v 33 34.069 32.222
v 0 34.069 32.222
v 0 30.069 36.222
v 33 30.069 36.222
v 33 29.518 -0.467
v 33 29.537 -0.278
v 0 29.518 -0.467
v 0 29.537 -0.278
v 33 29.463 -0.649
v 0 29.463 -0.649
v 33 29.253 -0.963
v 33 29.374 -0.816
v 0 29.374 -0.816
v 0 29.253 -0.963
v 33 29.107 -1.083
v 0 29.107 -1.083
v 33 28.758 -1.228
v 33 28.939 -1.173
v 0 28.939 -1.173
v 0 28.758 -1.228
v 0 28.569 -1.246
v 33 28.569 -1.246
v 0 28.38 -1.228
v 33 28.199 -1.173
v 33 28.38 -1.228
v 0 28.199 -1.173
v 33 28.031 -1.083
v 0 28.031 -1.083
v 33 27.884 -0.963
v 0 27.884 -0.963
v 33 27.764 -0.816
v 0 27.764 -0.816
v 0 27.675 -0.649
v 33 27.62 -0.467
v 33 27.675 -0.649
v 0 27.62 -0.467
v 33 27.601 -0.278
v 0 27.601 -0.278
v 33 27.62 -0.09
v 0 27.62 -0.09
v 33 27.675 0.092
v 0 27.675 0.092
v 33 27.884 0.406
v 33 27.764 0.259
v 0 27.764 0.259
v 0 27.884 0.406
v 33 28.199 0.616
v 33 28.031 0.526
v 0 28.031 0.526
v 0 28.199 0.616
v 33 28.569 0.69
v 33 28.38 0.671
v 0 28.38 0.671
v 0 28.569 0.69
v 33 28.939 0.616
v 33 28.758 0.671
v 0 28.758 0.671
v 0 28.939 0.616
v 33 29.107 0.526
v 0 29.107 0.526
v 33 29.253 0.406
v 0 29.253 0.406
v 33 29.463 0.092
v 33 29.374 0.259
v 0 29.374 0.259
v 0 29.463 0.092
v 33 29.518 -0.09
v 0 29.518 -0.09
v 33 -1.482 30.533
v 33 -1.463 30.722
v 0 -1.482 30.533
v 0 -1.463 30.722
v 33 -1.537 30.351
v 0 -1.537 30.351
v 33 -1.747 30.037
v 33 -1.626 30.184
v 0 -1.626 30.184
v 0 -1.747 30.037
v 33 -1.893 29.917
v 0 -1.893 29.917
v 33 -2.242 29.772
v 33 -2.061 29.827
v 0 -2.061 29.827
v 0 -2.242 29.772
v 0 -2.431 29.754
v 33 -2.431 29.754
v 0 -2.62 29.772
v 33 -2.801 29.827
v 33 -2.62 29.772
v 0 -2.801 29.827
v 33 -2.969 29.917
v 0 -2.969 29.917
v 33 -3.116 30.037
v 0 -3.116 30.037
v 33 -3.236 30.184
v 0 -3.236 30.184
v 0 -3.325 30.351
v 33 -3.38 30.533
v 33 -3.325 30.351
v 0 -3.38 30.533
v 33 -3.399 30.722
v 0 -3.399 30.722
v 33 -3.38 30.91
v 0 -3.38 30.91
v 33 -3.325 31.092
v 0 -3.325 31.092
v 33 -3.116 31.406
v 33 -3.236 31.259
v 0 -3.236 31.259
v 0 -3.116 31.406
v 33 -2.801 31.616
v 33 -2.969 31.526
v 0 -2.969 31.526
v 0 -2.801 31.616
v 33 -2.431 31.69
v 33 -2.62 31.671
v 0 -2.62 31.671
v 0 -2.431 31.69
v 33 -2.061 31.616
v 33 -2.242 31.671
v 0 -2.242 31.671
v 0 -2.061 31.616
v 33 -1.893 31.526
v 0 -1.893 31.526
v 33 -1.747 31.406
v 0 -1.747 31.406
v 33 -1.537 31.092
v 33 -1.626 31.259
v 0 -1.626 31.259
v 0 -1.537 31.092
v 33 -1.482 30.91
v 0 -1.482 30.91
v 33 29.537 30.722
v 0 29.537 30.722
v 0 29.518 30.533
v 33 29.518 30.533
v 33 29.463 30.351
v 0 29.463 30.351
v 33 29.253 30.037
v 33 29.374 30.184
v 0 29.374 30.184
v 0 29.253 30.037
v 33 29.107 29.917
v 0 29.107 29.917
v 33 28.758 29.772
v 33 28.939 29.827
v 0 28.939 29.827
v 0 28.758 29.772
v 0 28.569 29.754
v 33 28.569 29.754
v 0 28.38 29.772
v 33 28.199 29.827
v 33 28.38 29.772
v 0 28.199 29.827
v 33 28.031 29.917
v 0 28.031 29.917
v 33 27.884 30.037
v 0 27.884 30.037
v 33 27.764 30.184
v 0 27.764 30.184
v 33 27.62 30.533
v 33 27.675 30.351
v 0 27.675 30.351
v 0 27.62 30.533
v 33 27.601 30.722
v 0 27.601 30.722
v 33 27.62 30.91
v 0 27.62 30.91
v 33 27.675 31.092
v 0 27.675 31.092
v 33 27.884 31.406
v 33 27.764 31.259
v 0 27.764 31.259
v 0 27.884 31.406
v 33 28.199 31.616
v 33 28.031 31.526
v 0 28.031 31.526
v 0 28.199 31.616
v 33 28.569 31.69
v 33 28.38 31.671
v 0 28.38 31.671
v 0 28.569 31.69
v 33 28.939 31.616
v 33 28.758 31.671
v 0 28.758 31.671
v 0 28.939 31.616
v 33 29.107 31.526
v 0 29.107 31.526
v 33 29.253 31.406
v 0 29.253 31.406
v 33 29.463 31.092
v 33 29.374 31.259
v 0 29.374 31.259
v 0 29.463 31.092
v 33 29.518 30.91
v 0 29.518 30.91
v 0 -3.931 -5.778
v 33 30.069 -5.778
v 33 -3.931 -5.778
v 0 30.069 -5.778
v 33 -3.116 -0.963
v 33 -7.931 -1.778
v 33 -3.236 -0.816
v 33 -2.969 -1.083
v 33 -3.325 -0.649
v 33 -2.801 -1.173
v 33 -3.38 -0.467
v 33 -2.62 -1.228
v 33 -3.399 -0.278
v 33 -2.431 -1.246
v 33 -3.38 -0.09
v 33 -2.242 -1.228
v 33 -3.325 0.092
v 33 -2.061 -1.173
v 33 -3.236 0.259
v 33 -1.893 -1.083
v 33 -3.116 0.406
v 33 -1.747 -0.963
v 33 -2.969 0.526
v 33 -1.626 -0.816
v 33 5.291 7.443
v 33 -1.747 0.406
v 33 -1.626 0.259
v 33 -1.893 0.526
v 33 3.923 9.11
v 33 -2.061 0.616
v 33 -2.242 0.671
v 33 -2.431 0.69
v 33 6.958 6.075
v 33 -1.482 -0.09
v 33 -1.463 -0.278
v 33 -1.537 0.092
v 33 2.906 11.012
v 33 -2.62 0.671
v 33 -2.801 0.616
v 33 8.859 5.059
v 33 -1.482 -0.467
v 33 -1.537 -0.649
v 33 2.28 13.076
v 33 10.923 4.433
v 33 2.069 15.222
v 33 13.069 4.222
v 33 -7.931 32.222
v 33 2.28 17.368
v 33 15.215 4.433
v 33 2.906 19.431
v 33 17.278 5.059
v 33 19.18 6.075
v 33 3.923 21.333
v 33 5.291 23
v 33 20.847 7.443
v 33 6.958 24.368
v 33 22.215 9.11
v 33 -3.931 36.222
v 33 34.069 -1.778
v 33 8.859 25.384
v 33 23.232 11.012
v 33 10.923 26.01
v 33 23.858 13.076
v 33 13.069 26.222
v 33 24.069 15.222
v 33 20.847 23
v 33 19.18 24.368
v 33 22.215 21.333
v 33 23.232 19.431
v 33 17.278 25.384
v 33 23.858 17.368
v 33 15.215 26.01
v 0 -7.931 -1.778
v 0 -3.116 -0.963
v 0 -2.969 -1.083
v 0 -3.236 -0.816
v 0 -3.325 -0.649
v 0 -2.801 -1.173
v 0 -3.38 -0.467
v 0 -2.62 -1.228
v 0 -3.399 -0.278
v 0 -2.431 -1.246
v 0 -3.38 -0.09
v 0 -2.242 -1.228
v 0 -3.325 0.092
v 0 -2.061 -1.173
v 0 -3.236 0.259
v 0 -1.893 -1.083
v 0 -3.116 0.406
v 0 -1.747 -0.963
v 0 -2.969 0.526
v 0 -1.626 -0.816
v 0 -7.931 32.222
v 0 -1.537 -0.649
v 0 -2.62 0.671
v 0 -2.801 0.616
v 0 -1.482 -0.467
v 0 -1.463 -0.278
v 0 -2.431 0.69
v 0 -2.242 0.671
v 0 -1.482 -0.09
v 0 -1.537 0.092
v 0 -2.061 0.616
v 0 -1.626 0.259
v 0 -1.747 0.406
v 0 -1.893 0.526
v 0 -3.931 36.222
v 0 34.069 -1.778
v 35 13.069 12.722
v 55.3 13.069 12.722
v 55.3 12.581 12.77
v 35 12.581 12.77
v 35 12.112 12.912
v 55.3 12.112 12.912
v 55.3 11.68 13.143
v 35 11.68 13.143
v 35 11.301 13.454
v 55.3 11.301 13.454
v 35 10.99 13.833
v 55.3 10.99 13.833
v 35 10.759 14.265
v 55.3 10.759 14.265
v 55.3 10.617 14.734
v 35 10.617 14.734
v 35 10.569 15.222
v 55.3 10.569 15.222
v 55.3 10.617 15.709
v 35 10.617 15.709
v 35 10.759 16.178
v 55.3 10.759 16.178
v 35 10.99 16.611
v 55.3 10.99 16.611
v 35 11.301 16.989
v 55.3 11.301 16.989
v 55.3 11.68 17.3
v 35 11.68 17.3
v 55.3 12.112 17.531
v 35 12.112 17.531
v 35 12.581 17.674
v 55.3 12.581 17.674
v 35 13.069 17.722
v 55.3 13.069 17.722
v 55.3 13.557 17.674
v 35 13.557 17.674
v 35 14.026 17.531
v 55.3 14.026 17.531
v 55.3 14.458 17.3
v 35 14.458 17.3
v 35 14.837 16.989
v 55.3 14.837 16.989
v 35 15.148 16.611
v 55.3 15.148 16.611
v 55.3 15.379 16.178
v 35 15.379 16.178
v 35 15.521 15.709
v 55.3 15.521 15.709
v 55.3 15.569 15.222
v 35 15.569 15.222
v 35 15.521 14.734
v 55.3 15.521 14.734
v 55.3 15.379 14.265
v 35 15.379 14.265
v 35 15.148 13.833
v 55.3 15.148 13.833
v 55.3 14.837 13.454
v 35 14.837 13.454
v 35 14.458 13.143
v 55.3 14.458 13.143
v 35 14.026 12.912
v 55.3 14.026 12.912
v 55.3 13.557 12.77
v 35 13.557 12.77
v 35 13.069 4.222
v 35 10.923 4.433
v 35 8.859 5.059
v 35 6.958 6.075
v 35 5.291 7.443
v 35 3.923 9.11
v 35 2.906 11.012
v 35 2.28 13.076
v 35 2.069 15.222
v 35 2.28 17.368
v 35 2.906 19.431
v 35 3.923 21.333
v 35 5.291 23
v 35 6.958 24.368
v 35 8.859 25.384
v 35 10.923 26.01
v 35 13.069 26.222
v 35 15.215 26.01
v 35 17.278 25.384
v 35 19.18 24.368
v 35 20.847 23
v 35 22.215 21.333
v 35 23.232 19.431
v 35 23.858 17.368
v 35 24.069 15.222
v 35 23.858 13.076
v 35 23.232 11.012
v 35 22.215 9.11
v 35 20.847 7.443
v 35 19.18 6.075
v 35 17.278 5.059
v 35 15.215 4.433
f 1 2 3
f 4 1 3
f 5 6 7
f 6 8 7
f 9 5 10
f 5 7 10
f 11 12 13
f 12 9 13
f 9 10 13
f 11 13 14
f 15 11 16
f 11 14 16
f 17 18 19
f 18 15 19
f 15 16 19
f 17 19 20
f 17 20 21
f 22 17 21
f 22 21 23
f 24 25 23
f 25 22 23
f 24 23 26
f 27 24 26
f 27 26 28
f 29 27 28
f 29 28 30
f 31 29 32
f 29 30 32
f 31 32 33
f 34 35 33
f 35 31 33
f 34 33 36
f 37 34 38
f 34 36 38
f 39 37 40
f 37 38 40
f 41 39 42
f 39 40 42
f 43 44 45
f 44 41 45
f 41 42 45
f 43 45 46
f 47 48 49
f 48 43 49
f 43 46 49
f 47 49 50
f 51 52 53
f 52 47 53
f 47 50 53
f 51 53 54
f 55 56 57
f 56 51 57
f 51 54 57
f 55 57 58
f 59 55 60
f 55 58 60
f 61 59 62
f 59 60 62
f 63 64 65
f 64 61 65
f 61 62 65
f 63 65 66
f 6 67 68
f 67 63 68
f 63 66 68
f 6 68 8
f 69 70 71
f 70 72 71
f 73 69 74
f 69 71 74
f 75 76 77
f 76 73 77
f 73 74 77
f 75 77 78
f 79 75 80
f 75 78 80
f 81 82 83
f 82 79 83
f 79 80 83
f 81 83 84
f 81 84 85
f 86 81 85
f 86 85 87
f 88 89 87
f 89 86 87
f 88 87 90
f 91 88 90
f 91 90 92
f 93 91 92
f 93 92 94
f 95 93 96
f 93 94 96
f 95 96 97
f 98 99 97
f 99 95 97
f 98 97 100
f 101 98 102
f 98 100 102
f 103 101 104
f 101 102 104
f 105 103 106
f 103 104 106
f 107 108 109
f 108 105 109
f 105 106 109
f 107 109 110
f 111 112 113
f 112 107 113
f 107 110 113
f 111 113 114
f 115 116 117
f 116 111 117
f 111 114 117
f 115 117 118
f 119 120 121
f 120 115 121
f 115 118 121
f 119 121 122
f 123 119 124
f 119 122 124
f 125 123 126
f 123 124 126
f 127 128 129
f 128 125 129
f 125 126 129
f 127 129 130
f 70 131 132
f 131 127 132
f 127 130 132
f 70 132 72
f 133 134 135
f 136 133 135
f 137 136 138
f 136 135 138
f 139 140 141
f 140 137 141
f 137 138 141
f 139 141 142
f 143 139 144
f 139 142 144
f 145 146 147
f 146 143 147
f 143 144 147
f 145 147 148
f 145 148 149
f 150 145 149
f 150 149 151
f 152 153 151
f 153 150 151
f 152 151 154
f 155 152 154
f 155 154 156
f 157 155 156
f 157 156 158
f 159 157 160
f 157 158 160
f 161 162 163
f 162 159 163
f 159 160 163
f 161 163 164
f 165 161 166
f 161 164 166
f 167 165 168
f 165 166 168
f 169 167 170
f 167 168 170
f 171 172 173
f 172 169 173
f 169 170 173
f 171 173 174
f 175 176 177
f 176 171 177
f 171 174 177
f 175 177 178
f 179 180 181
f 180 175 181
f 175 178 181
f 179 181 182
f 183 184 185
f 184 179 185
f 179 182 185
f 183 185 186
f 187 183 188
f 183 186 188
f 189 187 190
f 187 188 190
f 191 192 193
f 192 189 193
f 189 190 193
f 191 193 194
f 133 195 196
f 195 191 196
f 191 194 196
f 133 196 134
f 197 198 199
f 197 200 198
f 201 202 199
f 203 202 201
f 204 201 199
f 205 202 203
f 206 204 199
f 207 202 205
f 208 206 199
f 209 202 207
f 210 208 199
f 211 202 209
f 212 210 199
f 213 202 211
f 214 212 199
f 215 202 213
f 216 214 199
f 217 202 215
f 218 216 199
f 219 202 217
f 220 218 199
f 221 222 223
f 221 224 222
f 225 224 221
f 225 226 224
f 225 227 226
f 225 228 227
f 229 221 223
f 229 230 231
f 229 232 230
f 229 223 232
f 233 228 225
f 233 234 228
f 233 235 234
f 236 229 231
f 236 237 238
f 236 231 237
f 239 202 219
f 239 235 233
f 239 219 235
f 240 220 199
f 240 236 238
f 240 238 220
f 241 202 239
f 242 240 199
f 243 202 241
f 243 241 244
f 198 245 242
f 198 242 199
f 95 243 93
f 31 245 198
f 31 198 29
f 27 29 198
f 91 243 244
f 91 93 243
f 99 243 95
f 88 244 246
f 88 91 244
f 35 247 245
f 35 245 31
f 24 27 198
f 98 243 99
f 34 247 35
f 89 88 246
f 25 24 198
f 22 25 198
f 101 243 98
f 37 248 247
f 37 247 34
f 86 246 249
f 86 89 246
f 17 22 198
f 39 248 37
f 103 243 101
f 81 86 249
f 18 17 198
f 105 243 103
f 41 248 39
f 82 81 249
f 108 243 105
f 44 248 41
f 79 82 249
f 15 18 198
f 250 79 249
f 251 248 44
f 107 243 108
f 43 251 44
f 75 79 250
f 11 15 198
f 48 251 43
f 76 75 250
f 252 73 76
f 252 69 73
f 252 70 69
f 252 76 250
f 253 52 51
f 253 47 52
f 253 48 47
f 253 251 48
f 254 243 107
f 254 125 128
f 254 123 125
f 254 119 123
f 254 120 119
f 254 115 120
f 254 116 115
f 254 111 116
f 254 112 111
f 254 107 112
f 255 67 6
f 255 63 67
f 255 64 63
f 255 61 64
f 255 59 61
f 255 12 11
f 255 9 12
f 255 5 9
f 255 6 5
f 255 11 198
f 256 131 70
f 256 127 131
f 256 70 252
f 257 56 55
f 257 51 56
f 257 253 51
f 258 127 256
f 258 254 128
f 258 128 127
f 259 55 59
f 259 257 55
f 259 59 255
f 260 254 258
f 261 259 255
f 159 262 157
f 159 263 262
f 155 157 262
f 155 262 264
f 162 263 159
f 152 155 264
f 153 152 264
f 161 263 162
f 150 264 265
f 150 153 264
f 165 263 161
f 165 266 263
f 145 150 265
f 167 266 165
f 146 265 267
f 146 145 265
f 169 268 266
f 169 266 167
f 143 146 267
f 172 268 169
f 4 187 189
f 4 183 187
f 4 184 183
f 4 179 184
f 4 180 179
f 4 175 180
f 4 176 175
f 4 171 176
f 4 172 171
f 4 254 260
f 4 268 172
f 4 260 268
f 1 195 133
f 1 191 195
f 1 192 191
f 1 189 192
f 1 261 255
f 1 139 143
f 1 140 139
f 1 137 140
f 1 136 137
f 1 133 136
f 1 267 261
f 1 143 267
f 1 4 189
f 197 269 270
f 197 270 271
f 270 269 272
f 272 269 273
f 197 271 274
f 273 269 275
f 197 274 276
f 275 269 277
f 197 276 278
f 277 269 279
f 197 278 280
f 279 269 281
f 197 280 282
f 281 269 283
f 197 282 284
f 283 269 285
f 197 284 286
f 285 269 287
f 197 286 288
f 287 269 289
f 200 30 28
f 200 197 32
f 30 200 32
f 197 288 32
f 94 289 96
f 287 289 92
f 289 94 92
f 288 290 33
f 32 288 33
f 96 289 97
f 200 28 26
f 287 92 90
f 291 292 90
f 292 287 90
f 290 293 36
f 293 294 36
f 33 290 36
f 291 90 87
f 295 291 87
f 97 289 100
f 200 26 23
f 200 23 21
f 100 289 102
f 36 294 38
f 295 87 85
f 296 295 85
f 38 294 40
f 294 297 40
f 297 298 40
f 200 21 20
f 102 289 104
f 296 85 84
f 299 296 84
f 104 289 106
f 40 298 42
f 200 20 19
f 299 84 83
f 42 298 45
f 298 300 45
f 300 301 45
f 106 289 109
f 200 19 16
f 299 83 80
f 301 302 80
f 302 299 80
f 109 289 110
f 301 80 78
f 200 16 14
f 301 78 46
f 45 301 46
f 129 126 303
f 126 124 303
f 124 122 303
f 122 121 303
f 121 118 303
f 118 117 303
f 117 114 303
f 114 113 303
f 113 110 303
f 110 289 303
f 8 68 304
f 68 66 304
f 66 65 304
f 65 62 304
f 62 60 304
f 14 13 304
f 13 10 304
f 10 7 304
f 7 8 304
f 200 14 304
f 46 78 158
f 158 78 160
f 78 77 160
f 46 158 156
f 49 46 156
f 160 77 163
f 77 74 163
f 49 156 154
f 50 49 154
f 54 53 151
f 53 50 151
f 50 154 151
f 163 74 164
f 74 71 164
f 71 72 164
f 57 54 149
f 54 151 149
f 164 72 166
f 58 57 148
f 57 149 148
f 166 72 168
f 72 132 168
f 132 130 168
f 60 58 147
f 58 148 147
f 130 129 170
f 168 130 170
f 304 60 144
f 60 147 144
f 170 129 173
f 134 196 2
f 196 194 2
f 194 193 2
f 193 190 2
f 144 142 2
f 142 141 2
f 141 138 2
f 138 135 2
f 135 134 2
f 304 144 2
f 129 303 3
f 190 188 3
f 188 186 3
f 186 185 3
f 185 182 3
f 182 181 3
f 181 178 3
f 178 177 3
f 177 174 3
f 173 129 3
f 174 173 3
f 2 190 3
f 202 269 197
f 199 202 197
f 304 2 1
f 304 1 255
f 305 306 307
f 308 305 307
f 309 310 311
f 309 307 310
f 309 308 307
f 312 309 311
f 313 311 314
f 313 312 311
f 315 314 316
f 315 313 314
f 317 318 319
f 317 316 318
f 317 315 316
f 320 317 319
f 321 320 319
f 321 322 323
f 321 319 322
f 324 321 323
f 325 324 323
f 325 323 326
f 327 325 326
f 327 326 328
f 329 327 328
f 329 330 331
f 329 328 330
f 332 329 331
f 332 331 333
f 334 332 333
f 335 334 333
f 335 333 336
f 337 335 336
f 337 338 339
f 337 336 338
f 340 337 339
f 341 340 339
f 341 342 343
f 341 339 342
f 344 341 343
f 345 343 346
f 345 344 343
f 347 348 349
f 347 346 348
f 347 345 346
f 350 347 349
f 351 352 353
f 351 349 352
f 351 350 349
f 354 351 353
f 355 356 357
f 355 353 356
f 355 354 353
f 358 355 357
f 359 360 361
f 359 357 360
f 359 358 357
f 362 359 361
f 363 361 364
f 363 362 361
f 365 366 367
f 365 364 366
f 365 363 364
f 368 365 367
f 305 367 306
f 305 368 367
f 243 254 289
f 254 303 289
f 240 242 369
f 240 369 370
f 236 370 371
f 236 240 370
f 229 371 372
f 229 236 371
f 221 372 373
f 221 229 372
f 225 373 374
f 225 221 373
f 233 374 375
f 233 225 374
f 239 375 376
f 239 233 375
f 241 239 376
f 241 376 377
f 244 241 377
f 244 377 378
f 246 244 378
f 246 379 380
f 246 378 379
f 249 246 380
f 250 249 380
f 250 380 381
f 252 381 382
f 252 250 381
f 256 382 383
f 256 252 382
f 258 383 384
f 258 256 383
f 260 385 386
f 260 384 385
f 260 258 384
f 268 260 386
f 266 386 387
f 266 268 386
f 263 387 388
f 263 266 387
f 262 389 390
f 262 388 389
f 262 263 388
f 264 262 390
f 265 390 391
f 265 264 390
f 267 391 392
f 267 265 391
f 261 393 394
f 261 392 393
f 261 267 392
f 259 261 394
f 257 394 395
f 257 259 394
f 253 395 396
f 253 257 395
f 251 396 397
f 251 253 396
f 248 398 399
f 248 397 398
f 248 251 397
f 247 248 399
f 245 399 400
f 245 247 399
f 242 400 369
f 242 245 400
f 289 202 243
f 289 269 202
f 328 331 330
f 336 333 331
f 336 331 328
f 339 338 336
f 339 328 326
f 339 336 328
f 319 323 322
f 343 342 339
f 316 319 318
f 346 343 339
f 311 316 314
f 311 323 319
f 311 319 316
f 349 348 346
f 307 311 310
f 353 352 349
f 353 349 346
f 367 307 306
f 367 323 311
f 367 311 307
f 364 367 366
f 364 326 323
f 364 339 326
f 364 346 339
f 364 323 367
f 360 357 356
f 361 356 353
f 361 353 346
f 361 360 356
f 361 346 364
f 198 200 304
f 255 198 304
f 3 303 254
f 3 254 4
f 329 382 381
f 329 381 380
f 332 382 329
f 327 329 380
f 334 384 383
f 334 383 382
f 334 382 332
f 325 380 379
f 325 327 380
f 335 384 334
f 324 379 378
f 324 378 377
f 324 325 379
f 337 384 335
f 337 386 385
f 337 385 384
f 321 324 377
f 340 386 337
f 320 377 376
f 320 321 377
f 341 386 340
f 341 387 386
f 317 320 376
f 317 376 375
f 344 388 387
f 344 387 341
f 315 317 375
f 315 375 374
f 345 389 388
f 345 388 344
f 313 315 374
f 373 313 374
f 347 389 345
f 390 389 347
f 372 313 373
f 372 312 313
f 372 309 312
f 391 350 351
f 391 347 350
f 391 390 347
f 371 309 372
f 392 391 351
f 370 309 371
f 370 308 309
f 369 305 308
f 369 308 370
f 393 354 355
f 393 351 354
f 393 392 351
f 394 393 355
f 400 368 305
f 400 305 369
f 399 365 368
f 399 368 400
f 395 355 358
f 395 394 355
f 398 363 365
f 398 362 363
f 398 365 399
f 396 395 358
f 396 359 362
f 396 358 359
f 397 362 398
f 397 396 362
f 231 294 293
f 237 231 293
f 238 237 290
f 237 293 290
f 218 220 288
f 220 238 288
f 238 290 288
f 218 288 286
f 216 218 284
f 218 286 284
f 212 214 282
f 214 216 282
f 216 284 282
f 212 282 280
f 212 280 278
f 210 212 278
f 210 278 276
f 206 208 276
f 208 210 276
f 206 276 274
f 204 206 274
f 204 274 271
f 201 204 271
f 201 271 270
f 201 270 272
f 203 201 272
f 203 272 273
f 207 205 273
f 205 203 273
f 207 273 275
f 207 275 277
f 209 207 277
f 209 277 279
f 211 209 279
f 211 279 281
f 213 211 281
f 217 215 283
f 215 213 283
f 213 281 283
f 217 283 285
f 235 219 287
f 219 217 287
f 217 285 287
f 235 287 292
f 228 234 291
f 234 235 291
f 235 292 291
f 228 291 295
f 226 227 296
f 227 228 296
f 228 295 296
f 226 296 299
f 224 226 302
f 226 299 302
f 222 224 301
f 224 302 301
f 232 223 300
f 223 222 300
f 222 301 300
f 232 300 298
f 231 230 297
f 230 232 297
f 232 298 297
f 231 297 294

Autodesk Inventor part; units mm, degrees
ref_plane "YZ Plane" through (0, 0, 0) normal (1, 0, 0) x (0, 1, 0)
ref_plane "XZ Plane" through (0, 0, 0) normal (0, 1, 0) x (-1, 0, 0)
ref_plane "XY Plane" through (0, 0, 0) normal (0, 0, 1) x (1, 0, 0)
sketch "Sketch1" plane through (0, 0, 0) normal (1, 0, 0) x (0, 1, 0)
  circle A0 centre (28.5689, 30.7216) radius 0.9679
  circle A1 centre (28.5689, -0.2784) radius 0.9679
  circle A2 centre (-2.4311, 30.7216) radius 0.9679
  circle A3 centre (-2.4311, -0.2784) radius 0.9679
  line L0 (-3.9311, 36.2216) -> (30.0689, 36.2216)
  line L1 (34.0689, 32.2216) -> (34.0689, -1.7784)
  line L2 (30.0689, -5.7784) -> (-3.9311, -5.7784)
  line L3 (-7.9311, -1.7784) -> (-7.9311, 32.2216)
  line L4 (-3.9311, 36.2216) -> (-7.9311, 32.2216)
  line L5 (-7.9311, -1.7784) -> (-3.9311, -5.7784)
  line L6 (30.0689, -5.7784) -> (34.0689, -1.7784)
  line L7 (34.0689, 32.2216) -> (30.0689, 36.2216)
  point P0 (-7.9311, 36.2216)
  point P1 (34.0689, -5.7784)
  point P2 (34.0689, 36.2216)
  point P3 (-7.9311, -5.7784)
  dimension "d5" = 31
  dimension "d6" = 31
  dimension "d8" = 31
  dimension "d16" = 42
  dimension "d17" = 42
  dimension "d18" = 5.5
  dimension "d19" = 5.5
  dimension "d21" = 4
  dimension "d22" = 4
  dimension "d23" = 4
  dimension "d24" = 4
  dimension "d25" = 4
  dimension "d26" = 4
  dimension "d27" = 4
  dimension "d28" = 4
extrude "Extrusion1" add sketch "Sketch1" along normal blind 33
sketch "Sketch2" plane through (33, 0, 0) normal (1, 0, 0) x (0, 0, -1)
  circle A0 centre (0.2784, -2.4311) radius 0.9679 projected
  circle A1 centre (-30.7216, -2.4311) radius 0.9679 projected
  circle A2 centre (0.2784, 28.5689) radius 0.9679 projected
  circle A3 centre (-30.7216, 28.5689) radius 0.9679 projected
  line L0 (-36.2216, -3.9311) -> (-32.2216, -7.9311) projected
  line L1 (-32.2216, -7.9311) -> (1.7784, -7.9311) projected
  line L2 (1.7784, -7.9311) -> (5.7784, -3.9311) projected
  line L3 (5.7784, -3.9311) -> (5.7784, 30.0689) projected
  line L4 (5.7784, 30.0689) -> (1.7784, 34.0689) projected
  line L5 (1.7784, 34.0689) -> (-32.2216, 34.0689) projected
  line L6 (-32.2216, 34.0689) -> (-36.2216, 30.0689) projected
  line L7 (-36.2216, 30.0689) -> (-36.2216, -3.9311) projected
  circle A4 centre (-15.2216, 13.0689) radius 2.5
  point P0 (0, 0)
  dimension "d29" = 5
extrude "Extrusion2" add sketch "Sketch2" along normal blind 22.3 contours A4
sketch "Sketch3" plane through (33, 0, 0) normal (1, 0, 0) x (0, 0, -1)
  circle A0 centre (-15.2216, 13.0689) radius 2.5 projected
  circle A1 centre (-15.2216, 13.0689) radius 11
  point P0 (0, 0)
  dimension "d32" = 22
extrude "Extrusion3" add sketch "Sketch3" along normal blind 2
equation "\"d22\" = d21"
equation "\"d23\" = d21"
equation "\"d24\" = d23"
equation "\"d25\" = d21"
equation "\"d26\" = d25"
equation "\"d27\" = d21"
equation "\"d28\" = d27"
properties part number "motor mount"
